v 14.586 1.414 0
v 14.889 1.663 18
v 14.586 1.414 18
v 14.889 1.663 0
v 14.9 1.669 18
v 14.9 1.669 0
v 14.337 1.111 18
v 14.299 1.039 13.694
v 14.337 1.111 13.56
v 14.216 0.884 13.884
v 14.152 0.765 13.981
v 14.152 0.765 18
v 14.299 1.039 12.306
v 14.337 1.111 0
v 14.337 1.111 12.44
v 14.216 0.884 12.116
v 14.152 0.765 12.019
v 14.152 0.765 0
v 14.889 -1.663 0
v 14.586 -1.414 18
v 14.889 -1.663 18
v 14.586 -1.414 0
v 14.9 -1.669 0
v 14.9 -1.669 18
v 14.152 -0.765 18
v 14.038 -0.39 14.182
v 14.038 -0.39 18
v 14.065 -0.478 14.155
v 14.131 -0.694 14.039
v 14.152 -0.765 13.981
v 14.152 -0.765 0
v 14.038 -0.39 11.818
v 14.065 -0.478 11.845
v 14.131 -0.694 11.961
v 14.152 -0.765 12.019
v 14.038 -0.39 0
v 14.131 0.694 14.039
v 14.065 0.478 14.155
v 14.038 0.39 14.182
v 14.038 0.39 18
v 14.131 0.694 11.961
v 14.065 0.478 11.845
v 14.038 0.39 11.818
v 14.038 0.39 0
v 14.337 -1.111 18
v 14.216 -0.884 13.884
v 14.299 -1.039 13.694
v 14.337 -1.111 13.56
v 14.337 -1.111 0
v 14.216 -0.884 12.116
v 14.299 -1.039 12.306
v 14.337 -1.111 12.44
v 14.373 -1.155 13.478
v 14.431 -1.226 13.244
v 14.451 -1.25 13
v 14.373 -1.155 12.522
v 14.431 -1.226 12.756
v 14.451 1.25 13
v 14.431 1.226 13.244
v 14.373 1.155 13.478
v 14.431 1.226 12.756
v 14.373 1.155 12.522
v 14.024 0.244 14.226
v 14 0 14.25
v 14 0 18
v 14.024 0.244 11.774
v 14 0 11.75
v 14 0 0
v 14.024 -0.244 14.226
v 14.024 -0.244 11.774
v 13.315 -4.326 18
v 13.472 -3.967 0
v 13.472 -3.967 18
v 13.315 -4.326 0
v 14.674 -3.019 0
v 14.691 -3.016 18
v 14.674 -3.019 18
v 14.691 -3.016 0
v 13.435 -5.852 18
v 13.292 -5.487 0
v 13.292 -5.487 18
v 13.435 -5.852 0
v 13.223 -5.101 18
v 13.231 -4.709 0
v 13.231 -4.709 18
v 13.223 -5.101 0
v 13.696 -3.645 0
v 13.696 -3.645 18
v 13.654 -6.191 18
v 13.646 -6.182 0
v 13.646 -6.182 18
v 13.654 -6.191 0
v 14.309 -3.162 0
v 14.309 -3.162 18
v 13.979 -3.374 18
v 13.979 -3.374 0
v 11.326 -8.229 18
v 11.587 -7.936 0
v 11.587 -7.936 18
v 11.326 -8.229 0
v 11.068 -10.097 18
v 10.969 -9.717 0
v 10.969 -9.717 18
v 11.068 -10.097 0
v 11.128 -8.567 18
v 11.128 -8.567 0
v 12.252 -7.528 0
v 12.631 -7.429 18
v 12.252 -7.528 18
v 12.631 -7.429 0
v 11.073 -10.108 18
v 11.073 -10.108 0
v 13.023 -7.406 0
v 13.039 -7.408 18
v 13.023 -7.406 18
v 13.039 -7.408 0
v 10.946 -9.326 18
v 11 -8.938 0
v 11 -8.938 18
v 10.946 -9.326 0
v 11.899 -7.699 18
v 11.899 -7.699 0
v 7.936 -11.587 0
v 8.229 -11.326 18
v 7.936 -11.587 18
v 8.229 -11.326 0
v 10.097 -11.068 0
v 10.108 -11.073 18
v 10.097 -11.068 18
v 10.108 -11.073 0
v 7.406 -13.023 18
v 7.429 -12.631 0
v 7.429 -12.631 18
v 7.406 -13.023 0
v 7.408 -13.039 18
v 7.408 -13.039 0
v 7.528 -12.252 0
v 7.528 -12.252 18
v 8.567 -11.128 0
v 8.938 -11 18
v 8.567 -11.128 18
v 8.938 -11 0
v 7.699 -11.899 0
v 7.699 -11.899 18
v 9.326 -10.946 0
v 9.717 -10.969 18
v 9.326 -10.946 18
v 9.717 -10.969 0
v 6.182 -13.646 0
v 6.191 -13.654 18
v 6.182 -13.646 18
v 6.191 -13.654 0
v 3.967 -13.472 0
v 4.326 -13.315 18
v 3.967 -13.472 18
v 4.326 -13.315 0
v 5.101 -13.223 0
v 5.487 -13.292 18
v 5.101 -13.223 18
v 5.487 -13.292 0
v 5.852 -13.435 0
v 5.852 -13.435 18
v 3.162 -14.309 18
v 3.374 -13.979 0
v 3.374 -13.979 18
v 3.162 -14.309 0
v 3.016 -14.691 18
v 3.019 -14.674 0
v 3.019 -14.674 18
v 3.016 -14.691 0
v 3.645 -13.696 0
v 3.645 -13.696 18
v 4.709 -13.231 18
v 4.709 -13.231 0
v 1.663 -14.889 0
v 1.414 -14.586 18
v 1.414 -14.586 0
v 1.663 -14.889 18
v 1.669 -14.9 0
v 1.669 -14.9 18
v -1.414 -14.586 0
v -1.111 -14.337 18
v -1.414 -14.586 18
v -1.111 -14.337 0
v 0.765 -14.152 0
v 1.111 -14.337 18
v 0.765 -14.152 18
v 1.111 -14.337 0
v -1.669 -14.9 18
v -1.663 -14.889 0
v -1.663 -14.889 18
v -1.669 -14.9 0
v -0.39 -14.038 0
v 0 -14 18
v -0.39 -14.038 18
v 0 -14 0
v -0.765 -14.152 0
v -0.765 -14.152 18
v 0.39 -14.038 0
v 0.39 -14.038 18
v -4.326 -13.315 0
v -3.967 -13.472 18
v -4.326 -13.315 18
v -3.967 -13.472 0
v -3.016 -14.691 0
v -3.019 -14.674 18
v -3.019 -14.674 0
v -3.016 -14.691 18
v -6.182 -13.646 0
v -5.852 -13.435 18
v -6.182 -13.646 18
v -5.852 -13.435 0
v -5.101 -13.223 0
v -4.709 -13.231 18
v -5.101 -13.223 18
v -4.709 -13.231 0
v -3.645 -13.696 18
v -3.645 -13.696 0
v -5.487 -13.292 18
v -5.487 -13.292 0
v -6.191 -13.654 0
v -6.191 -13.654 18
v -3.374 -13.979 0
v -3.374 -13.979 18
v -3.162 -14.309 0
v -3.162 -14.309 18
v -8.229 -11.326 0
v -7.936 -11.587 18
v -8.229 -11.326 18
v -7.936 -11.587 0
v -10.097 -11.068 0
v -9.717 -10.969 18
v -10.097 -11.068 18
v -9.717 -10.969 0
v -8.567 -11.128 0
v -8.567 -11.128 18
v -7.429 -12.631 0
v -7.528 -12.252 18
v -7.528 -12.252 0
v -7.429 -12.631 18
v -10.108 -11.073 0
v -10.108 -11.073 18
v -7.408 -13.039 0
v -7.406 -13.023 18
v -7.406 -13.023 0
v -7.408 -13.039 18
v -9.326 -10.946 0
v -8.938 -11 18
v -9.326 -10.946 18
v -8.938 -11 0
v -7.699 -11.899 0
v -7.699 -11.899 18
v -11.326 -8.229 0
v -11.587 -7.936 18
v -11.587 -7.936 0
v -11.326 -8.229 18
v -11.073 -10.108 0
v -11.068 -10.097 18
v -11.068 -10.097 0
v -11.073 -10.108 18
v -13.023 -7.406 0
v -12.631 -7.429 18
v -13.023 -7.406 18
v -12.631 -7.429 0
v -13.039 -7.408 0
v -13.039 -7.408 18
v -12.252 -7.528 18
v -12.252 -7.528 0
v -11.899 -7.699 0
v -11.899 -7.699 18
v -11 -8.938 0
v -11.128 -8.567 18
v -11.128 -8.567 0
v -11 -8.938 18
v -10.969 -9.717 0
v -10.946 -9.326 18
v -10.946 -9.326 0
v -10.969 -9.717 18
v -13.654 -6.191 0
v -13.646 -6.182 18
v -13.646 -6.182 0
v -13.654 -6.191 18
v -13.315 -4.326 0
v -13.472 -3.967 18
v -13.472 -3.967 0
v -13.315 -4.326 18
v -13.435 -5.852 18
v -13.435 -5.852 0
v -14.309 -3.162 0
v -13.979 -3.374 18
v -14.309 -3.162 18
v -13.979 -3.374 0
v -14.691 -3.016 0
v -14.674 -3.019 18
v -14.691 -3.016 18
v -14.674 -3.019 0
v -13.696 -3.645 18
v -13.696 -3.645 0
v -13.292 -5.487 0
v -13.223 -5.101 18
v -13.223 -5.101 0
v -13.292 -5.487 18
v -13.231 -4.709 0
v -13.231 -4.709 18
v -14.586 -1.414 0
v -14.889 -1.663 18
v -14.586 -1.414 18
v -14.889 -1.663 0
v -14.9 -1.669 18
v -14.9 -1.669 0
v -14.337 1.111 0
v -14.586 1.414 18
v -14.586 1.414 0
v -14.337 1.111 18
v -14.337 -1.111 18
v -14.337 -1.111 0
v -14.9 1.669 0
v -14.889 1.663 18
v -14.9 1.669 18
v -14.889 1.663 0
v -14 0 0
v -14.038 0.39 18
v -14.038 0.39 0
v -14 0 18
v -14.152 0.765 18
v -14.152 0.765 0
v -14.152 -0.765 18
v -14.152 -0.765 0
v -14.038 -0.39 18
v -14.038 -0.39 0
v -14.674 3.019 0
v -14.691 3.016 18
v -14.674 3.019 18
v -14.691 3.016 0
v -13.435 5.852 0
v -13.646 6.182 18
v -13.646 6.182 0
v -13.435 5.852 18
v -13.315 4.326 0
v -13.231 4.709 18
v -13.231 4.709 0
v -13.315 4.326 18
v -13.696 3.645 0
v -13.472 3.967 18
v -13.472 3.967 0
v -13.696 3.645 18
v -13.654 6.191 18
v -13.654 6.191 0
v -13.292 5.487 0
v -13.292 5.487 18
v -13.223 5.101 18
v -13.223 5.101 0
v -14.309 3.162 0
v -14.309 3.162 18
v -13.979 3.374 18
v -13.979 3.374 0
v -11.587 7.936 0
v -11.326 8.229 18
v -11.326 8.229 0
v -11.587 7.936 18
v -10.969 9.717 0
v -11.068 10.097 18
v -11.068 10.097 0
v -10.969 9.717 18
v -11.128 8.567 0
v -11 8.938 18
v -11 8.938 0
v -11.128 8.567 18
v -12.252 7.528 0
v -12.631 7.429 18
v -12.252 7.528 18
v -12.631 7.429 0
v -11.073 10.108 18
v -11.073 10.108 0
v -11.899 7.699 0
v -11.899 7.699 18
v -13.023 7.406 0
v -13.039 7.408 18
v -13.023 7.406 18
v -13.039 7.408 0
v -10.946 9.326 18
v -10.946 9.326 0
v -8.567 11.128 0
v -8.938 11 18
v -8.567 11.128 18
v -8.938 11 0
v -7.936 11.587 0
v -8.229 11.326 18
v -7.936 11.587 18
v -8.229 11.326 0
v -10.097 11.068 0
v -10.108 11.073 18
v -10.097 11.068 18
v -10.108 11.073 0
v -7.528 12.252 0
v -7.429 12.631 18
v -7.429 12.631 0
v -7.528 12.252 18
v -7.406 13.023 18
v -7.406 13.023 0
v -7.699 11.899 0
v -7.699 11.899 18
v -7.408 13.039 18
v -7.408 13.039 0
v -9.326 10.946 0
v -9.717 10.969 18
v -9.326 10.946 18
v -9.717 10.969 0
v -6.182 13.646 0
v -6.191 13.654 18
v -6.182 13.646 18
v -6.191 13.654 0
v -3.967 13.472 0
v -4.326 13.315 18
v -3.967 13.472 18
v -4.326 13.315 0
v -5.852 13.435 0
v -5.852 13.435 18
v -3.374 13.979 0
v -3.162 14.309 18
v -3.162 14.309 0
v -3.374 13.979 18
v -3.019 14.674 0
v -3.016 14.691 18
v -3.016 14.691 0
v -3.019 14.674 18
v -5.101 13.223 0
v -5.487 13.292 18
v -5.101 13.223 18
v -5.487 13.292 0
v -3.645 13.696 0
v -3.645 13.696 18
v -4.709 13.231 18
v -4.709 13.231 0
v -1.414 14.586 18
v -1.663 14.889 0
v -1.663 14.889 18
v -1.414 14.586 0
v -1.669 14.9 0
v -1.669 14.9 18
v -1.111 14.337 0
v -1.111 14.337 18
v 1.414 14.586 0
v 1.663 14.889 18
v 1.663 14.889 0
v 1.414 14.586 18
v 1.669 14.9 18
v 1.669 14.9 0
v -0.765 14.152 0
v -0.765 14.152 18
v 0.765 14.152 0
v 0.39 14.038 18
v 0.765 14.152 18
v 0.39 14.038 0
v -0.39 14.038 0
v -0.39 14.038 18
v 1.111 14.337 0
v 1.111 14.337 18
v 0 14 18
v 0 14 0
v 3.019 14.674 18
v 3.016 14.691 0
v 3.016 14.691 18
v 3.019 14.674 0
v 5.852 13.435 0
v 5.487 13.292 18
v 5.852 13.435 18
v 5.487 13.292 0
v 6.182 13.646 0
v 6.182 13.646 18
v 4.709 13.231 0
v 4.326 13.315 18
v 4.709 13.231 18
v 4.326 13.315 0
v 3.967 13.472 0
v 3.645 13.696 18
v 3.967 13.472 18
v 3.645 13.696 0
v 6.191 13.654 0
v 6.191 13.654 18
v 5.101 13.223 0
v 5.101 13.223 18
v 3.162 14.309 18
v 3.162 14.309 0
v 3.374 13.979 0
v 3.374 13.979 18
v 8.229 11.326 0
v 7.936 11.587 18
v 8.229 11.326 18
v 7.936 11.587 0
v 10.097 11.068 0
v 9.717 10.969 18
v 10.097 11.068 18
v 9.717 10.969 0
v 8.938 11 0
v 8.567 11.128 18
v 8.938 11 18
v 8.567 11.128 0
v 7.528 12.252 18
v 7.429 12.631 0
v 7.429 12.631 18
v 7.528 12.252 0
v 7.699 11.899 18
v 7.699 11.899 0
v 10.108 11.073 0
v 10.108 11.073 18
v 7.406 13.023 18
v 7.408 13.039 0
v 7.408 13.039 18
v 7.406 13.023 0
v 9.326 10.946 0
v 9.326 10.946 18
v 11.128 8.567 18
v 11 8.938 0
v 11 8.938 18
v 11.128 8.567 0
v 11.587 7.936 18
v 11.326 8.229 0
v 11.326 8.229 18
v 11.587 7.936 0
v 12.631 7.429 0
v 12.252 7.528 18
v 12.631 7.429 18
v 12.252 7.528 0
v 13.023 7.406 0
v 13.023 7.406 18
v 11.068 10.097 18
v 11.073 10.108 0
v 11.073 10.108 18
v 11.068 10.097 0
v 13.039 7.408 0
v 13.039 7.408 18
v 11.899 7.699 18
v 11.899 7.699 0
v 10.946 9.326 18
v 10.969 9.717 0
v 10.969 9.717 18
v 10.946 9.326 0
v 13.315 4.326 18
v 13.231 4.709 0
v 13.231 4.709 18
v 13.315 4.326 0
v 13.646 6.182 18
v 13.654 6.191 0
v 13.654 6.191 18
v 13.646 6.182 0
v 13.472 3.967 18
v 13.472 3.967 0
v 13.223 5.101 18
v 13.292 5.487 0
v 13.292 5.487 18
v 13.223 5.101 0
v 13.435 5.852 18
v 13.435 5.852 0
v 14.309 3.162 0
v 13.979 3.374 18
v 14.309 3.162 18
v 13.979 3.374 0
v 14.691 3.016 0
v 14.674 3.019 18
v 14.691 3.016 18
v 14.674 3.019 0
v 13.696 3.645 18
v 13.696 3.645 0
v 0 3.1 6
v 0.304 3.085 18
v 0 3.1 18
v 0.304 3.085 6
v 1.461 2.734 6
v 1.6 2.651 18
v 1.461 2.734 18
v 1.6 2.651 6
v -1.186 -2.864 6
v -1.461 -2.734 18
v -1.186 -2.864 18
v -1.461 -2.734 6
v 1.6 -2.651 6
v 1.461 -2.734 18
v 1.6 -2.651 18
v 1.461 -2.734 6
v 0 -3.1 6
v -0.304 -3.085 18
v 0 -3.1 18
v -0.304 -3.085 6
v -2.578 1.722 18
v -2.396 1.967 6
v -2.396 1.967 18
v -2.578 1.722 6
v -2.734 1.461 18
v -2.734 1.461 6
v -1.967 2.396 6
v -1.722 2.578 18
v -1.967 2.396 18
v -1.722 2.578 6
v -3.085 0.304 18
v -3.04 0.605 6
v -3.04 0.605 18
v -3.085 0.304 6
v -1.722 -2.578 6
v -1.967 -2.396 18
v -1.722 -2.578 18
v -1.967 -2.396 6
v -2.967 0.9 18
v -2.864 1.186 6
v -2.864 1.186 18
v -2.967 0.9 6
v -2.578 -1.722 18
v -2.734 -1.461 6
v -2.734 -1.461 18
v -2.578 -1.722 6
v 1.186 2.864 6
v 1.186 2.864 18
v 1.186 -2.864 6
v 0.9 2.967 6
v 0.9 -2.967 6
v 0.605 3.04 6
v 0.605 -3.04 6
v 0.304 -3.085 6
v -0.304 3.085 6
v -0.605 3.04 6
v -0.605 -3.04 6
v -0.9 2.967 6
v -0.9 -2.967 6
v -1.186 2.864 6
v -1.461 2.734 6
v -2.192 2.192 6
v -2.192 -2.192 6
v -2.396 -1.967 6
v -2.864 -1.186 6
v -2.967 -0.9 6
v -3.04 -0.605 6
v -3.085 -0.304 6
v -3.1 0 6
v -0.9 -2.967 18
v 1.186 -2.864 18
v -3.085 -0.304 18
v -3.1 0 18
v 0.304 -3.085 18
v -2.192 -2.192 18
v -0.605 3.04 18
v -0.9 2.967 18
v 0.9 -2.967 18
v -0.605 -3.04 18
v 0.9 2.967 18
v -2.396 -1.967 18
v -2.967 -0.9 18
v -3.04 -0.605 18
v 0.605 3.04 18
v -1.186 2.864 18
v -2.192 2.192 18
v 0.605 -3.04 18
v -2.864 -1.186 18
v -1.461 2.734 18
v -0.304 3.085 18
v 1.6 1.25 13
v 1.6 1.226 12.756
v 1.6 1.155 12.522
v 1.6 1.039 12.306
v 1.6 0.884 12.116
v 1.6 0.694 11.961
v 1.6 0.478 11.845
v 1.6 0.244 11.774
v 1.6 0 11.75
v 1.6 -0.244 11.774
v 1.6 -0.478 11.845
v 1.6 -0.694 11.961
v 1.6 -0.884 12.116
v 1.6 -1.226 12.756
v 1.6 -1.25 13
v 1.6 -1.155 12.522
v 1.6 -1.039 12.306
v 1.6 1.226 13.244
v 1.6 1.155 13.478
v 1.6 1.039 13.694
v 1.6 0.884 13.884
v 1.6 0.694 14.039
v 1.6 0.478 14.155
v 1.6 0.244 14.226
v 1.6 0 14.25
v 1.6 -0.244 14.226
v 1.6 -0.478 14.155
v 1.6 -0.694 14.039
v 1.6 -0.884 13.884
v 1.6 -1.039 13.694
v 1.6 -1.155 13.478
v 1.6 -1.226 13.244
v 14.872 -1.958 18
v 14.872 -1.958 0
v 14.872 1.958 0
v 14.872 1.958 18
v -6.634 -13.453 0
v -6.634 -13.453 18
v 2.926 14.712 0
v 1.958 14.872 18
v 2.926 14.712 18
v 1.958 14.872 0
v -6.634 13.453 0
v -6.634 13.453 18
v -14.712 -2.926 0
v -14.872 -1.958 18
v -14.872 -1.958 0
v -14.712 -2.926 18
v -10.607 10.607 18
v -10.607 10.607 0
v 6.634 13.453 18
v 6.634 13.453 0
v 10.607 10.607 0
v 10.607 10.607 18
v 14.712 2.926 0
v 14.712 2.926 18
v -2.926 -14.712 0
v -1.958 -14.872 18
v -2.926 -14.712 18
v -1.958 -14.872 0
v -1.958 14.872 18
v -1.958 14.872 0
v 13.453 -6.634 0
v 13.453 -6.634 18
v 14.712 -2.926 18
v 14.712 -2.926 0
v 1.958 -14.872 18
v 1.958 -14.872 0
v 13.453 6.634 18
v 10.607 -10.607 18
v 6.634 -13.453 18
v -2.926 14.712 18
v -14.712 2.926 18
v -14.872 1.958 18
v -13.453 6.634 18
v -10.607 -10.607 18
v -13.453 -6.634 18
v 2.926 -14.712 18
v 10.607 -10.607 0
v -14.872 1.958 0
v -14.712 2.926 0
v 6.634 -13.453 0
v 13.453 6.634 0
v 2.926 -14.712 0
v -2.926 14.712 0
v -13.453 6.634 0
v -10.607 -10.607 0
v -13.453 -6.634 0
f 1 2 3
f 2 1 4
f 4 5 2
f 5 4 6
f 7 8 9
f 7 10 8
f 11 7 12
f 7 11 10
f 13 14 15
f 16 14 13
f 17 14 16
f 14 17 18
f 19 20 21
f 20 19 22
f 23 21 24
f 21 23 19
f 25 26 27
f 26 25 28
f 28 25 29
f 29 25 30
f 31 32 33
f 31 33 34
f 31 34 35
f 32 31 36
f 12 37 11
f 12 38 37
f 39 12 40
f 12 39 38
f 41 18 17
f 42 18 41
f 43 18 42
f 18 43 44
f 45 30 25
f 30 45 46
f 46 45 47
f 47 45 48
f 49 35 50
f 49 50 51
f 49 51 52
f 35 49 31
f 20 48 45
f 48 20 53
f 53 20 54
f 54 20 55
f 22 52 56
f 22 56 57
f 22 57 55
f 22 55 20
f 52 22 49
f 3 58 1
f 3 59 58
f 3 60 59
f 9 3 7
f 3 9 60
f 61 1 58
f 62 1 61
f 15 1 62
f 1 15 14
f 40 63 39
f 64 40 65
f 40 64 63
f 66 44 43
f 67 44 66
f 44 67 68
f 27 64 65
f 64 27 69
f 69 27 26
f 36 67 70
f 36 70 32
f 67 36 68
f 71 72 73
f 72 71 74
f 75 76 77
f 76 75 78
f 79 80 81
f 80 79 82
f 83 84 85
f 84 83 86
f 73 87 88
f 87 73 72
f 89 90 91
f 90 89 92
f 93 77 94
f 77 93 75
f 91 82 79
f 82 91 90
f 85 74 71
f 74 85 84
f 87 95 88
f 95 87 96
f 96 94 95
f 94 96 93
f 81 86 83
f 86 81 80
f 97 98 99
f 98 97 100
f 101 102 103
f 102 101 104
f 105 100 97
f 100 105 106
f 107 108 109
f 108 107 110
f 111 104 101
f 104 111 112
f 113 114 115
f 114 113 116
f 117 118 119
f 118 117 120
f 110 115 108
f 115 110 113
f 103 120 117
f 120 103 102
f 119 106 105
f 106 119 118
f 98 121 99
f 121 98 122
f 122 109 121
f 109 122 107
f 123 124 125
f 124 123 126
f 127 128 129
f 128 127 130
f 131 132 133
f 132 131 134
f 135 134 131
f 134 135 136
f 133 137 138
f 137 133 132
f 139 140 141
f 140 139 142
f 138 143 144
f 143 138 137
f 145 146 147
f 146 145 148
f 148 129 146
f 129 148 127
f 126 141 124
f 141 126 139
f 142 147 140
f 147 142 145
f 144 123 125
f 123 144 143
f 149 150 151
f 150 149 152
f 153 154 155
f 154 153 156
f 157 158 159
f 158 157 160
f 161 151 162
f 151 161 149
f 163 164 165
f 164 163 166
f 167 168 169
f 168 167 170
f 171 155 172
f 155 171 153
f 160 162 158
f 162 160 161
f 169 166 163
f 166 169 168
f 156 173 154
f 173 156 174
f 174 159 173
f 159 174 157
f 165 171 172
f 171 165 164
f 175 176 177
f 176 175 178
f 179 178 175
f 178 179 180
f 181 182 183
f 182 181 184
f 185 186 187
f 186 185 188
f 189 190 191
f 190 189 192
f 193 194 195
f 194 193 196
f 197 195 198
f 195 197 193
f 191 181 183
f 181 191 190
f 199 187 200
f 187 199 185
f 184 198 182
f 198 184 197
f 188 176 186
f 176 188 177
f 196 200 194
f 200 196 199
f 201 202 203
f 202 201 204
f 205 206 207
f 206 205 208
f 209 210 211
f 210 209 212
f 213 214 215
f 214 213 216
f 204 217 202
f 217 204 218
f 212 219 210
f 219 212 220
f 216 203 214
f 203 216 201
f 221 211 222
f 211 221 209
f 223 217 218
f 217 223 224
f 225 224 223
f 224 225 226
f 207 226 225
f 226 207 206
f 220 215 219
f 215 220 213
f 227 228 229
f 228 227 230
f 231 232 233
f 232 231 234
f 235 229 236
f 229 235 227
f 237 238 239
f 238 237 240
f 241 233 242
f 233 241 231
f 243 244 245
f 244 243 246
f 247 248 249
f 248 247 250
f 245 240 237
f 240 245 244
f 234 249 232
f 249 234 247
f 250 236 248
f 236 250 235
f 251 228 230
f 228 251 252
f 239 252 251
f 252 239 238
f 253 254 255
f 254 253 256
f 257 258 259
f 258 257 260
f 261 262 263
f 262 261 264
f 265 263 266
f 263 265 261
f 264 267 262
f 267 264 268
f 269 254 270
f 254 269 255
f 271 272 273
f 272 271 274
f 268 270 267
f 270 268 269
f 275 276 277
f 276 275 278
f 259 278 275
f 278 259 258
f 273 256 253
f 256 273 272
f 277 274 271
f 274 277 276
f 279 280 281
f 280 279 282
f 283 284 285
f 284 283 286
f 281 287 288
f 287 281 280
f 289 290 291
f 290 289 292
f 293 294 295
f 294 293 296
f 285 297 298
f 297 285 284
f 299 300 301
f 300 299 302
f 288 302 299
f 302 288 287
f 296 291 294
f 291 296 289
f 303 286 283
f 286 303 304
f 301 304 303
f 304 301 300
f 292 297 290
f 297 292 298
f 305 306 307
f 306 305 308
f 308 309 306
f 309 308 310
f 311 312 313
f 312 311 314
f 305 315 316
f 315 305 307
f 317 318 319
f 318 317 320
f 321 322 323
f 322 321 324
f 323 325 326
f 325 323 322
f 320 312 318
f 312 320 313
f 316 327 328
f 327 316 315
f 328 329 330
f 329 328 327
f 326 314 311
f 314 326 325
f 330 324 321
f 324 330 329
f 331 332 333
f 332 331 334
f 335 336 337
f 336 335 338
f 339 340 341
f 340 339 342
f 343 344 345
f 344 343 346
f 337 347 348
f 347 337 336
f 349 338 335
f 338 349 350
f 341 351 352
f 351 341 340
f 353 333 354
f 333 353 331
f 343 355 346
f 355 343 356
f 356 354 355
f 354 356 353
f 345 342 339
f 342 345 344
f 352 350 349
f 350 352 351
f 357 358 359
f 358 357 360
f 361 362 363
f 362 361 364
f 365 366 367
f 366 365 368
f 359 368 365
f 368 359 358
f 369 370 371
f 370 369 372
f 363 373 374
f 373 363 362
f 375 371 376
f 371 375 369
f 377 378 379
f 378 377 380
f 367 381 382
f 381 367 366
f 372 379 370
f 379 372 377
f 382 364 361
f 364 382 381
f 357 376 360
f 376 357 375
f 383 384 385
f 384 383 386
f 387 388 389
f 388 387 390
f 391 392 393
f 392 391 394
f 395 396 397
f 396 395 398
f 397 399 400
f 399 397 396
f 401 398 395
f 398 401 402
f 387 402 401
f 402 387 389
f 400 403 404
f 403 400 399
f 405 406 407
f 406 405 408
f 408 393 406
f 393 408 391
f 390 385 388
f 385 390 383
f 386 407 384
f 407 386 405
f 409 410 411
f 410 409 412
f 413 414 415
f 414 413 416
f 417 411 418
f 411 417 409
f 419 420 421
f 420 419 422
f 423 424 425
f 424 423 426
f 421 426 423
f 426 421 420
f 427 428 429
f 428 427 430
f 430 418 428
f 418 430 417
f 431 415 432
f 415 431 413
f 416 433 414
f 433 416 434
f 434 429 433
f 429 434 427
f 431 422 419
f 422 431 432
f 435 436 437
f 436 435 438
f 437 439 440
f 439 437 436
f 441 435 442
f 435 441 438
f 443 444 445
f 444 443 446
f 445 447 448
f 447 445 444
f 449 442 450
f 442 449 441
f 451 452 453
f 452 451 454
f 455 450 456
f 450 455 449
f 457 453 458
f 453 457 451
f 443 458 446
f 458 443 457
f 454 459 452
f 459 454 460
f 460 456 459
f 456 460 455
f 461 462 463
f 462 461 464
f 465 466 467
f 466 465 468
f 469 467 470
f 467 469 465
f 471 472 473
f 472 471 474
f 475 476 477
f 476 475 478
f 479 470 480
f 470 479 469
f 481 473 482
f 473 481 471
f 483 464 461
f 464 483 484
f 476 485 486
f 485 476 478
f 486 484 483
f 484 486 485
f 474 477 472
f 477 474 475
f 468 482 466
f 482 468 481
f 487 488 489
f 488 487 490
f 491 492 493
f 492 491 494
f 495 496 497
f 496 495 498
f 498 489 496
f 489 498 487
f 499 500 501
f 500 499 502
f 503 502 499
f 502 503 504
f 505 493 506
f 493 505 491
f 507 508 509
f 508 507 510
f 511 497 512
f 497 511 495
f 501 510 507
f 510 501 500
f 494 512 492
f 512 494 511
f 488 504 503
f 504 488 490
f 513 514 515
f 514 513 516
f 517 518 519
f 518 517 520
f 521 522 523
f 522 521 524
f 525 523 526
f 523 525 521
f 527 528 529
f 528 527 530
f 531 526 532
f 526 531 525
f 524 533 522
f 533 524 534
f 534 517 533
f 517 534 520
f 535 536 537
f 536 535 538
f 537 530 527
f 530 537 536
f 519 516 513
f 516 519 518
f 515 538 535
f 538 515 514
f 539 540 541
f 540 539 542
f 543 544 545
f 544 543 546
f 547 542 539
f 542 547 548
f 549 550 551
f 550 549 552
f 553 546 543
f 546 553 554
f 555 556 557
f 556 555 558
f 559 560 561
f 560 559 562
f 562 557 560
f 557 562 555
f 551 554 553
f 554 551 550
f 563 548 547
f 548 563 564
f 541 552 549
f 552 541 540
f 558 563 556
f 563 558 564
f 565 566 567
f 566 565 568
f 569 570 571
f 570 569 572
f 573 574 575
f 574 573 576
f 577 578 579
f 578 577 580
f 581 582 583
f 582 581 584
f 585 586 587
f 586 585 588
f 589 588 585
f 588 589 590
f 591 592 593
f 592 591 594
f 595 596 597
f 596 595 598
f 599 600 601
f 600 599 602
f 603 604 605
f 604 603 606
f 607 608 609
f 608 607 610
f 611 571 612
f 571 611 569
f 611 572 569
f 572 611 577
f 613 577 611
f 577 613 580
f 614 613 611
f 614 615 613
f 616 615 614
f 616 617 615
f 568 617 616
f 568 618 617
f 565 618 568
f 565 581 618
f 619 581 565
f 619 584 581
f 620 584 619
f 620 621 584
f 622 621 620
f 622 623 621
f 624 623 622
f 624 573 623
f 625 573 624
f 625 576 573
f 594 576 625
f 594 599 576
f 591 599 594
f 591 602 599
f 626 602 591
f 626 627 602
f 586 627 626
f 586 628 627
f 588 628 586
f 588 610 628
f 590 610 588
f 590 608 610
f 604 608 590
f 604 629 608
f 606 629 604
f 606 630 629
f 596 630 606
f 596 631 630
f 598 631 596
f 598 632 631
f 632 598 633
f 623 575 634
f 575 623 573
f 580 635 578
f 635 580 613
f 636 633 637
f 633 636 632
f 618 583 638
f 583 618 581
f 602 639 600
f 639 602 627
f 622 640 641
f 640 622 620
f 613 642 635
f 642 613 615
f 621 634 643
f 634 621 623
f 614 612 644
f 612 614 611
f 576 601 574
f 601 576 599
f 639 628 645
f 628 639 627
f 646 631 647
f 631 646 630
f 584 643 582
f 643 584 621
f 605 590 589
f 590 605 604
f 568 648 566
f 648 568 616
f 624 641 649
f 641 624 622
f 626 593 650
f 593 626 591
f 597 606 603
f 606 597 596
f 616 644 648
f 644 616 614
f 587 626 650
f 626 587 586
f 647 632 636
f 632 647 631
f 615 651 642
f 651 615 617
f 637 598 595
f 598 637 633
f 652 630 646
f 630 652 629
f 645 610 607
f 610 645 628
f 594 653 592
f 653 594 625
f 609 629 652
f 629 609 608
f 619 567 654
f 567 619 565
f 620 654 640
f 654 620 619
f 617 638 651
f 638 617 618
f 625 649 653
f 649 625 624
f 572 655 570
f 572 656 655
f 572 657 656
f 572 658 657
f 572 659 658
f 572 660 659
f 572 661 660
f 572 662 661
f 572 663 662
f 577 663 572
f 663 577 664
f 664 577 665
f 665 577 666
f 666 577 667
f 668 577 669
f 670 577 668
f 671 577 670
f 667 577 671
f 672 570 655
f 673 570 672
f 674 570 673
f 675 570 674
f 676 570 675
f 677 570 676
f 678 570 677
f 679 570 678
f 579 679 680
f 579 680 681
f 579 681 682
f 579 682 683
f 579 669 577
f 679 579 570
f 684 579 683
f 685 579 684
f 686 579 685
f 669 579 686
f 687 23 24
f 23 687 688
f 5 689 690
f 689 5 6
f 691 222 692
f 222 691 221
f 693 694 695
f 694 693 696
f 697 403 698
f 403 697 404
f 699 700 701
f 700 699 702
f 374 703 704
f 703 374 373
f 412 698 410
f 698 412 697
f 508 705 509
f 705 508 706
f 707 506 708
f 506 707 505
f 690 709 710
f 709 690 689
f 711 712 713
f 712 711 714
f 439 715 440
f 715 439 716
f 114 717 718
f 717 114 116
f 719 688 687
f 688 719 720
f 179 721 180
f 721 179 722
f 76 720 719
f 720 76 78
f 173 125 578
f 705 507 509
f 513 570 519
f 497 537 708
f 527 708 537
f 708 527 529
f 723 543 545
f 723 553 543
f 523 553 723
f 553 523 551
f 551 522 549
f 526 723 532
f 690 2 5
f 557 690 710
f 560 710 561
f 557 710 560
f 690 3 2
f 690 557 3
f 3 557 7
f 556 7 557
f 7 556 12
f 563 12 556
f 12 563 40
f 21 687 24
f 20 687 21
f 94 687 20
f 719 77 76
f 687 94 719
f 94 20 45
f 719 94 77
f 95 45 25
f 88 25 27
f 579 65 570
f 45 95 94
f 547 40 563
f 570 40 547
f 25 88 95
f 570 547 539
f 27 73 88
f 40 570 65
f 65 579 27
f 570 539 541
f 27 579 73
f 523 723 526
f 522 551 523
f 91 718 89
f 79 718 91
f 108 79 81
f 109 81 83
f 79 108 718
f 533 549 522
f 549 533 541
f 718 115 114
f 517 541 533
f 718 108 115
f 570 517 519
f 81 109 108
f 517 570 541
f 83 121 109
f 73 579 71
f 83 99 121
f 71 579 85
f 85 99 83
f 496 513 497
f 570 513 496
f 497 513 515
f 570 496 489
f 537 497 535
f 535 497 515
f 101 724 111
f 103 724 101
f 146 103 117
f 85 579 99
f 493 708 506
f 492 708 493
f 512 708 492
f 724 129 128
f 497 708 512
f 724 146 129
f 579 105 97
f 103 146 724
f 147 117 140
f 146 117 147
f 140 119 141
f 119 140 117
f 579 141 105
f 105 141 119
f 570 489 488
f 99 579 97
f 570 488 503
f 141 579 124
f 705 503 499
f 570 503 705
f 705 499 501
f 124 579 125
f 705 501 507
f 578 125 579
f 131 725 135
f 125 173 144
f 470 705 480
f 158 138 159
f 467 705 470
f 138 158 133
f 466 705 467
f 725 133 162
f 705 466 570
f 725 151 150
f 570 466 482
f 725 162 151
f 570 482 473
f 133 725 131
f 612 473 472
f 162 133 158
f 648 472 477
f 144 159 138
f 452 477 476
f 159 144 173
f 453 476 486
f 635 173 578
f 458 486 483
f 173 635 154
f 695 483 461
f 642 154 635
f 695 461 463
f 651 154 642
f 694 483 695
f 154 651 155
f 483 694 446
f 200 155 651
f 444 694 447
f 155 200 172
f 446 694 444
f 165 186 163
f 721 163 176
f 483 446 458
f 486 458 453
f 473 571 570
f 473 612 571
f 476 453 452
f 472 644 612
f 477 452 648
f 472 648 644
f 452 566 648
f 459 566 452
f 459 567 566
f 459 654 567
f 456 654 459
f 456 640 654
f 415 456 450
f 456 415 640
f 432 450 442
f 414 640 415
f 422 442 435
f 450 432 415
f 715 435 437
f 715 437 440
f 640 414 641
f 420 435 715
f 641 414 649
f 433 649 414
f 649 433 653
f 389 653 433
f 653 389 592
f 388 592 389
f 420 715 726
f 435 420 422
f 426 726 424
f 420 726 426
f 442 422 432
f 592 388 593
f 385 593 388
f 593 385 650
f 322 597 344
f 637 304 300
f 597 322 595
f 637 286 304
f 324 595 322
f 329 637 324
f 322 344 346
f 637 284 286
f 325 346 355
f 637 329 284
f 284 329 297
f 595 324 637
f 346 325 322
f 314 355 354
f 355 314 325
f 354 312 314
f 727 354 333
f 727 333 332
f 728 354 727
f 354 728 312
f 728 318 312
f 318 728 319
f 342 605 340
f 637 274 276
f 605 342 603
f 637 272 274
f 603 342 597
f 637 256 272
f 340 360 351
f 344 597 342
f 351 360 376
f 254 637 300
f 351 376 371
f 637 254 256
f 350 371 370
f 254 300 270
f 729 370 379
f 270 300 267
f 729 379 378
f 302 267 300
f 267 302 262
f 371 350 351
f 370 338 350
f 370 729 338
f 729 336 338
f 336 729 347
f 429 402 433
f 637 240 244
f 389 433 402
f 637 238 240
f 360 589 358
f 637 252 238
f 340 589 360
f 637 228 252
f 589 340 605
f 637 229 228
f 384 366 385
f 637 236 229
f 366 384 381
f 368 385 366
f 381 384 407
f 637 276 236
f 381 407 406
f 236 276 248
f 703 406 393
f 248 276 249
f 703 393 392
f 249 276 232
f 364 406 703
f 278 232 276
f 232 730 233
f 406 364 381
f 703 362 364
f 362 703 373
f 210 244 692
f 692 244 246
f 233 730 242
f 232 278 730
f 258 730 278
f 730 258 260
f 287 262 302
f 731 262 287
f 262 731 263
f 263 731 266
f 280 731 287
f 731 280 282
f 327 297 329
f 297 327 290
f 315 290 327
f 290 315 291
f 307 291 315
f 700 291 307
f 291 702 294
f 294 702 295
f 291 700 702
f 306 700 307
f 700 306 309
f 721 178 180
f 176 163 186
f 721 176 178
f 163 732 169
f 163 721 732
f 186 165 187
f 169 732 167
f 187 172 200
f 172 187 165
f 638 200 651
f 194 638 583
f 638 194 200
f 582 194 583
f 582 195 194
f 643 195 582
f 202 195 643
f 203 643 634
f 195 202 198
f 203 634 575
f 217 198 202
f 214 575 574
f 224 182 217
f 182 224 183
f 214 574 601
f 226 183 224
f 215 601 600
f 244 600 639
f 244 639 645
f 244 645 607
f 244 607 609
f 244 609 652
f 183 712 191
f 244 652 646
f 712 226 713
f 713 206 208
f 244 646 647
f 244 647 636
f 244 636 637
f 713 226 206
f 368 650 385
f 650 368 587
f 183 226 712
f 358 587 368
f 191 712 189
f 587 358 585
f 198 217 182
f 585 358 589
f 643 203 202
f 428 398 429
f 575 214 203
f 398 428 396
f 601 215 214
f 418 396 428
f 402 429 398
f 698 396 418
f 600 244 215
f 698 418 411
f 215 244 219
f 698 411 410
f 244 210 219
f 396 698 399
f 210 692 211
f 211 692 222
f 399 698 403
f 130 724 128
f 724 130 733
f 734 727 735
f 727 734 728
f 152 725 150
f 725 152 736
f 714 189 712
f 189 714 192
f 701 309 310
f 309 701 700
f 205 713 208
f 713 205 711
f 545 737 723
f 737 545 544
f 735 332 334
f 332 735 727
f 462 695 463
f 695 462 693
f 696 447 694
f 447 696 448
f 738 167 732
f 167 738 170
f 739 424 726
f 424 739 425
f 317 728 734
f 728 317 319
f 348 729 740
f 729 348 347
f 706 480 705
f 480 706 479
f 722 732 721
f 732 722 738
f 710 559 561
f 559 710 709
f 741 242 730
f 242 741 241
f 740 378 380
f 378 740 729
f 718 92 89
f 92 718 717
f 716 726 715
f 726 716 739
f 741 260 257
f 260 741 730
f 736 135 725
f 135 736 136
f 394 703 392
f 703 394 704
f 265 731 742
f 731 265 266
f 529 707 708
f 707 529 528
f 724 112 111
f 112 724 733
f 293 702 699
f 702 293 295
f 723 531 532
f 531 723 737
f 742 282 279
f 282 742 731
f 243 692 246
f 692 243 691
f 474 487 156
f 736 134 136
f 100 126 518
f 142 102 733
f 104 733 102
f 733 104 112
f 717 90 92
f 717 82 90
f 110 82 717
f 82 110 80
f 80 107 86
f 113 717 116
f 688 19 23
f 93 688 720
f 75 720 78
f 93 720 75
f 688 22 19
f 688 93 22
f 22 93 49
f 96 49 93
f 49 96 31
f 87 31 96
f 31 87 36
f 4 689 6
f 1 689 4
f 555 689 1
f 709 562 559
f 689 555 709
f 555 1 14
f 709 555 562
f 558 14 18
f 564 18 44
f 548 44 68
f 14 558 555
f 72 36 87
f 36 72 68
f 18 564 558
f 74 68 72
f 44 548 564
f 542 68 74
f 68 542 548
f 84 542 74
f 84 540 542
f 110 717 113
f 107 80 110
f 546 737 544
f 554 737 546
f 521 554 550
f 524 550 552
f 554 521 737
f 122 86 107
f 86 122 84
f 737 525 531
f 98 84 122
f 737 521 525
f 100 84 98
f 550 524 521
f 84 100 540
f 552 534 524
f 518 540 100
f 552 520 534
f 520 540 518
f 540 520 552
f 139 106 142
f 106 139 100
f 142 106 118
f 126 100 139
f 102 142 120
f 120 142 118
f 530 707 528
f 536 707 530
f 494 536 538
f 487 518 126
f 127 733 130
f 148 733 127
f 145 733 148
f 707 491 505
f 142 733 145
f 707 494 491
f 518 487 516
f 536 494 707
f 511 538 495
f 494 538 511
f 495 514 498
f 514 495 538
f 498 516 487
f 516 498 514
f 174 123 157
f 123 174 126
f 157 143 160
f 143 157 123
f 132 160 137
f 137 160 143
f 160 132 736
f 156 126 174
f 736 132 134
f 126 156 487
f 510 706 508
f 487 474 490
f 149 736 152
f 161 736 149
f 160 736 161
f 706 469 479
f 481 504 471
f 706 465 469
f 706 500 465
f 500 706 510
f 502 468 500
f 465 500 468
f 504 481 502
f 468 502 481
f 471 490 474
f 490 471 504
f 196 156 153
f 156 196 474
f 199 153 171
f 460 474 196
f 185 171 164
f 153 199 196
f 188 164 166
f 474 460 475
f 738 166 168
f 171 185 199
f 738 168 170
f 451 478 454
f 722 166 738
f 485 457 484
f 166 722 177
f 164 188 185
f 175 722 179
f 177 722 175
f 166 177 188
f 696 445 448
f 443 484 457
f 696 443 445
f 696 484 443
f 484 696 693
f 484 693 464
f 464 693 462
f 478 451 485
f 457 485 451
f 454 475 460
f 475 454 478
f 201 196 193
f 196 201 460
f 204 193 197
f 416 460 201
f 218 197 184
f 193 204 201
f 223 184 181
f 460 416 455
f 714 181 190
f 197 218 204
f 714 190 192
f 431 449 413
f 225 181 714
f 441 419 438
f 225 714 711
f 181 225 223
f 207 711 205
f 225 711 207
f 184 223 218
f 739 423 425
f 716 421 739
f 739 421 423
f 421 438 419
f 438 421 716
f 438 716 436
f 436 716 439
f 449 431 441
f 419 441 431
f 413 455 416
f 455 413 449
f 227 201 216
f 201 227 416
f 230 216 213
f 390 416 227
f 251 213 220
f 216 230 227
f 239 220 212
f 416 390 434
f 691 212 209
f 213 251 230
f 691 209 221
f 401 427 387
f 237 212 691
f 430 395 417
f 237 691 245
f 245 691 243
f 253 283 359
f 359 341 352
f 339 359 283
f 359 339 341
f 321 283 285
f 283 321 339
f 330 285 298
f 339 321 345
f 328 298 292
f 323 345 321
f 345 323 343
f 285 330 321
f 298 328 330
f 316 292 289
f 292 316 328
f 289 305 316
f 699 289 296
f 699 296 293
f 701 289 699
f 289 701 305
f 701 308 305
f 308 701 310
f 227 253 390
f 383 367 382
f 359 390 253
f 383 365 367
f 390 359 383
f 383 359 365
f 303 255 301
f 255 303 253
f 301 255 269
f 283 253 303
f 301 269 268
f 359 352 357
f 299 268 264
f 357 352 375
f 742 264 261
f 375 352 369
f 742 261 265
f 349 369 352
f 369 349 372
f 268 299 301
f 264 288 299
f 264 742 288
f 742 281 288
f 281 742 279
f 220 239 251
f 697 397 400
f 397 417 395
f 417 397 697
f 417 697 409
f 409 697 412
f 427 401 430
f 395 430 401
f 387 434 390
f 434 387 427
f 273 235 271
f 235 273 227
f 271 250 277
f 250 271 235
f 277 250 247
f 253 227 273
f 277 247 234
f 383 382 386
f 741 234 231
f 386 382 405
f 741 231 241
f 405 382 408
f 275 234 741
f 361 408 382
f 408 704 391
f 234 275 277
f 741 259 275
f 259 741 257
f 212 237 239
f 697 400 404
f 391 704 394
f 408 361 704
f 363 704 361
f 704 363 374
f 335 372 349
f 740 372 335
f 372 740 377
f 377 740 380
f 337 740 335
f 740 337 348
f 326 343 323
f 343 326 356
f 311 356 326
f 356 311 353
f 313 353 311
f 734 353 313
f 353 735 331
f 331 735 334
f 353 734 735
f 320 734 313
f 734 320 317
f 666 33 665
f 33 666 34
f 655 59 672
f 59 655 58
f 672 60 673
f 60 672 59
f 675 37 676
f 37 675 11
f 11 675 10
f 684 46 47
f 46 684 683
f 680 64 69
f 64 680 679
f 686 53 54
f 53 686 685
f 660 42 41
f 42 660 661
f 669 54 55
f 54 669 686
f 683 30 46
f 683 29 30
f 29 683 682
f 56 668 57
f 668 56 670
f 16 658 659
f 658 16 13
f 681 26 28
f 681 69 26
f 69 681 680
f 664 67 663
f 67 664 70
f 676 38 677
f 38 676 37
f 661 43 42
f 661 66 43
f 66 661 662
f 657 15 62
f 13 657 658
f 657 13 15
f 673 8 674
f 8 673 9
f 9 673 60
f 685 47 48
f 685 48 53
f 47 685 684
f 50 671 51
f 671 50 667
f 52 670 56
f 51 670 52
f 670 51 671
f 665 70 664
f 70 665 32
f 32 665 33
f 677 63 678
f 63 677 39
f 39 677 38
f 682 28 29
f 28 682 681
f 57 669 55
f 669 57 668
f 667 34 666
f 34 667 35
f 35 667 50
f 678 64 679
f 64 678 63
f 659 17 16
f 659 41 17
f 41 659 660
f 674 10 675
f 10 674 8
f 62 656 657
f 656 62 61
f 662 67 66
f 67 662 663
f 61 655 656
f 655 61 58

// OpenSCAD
// T5 reference for the grader's self-check (test_grade.py): a knob for a
// 6 D-shaft, printed top down so the bore opens upward (-D flip=false
// prints it bore down). Overridden for the wrong variants: `flutes`,
// `flute_d` (depth), `flat` (flat to far side), `depth` (bore) and
// `screw_z` (set screw axis from the bottom face).
d = 30;
h = 18;
flutes = 20;
flute_d = 1;
bore = 6.2;
flat = 4.7;
depth = 12;
screw = 2.5;
screw_z = 5;
flip = true;
$fn = 96;

// A flute is a groove cut by a cylinder whose edge reaches flute_d in.
fr = 2;
module knob() difference() {
    cylinder(d = d, h = h);
    for (i = [0:flutes - 1]) rotate(360 * i / flutes)
        translate([d / 2 + fr - flute_d, 0, -1]) cylinder(r = fr, h = h + 2, $fn = 32);
    // D bore from the bottom face (z = 0): the flat faces +x.
    translate([0, 0, -1]) intersection() {
        cylinder(d = bore, h = depth + 1, $fn = 64);
        translate([-bore / 2, -bore / 2, 0]) cube([flat, bore, depth + 1]);
    }
    // Set screw: radial along +x, through the middle of the flat.
    translate([0, 0, screw_z]) rotate([0, 90, 0]) cylinder(d = screw, h = d, $fn = 32);
}

if (flip) translate([0, 0, h]) rotate([180, 0, 0]) knob();
else knob();
